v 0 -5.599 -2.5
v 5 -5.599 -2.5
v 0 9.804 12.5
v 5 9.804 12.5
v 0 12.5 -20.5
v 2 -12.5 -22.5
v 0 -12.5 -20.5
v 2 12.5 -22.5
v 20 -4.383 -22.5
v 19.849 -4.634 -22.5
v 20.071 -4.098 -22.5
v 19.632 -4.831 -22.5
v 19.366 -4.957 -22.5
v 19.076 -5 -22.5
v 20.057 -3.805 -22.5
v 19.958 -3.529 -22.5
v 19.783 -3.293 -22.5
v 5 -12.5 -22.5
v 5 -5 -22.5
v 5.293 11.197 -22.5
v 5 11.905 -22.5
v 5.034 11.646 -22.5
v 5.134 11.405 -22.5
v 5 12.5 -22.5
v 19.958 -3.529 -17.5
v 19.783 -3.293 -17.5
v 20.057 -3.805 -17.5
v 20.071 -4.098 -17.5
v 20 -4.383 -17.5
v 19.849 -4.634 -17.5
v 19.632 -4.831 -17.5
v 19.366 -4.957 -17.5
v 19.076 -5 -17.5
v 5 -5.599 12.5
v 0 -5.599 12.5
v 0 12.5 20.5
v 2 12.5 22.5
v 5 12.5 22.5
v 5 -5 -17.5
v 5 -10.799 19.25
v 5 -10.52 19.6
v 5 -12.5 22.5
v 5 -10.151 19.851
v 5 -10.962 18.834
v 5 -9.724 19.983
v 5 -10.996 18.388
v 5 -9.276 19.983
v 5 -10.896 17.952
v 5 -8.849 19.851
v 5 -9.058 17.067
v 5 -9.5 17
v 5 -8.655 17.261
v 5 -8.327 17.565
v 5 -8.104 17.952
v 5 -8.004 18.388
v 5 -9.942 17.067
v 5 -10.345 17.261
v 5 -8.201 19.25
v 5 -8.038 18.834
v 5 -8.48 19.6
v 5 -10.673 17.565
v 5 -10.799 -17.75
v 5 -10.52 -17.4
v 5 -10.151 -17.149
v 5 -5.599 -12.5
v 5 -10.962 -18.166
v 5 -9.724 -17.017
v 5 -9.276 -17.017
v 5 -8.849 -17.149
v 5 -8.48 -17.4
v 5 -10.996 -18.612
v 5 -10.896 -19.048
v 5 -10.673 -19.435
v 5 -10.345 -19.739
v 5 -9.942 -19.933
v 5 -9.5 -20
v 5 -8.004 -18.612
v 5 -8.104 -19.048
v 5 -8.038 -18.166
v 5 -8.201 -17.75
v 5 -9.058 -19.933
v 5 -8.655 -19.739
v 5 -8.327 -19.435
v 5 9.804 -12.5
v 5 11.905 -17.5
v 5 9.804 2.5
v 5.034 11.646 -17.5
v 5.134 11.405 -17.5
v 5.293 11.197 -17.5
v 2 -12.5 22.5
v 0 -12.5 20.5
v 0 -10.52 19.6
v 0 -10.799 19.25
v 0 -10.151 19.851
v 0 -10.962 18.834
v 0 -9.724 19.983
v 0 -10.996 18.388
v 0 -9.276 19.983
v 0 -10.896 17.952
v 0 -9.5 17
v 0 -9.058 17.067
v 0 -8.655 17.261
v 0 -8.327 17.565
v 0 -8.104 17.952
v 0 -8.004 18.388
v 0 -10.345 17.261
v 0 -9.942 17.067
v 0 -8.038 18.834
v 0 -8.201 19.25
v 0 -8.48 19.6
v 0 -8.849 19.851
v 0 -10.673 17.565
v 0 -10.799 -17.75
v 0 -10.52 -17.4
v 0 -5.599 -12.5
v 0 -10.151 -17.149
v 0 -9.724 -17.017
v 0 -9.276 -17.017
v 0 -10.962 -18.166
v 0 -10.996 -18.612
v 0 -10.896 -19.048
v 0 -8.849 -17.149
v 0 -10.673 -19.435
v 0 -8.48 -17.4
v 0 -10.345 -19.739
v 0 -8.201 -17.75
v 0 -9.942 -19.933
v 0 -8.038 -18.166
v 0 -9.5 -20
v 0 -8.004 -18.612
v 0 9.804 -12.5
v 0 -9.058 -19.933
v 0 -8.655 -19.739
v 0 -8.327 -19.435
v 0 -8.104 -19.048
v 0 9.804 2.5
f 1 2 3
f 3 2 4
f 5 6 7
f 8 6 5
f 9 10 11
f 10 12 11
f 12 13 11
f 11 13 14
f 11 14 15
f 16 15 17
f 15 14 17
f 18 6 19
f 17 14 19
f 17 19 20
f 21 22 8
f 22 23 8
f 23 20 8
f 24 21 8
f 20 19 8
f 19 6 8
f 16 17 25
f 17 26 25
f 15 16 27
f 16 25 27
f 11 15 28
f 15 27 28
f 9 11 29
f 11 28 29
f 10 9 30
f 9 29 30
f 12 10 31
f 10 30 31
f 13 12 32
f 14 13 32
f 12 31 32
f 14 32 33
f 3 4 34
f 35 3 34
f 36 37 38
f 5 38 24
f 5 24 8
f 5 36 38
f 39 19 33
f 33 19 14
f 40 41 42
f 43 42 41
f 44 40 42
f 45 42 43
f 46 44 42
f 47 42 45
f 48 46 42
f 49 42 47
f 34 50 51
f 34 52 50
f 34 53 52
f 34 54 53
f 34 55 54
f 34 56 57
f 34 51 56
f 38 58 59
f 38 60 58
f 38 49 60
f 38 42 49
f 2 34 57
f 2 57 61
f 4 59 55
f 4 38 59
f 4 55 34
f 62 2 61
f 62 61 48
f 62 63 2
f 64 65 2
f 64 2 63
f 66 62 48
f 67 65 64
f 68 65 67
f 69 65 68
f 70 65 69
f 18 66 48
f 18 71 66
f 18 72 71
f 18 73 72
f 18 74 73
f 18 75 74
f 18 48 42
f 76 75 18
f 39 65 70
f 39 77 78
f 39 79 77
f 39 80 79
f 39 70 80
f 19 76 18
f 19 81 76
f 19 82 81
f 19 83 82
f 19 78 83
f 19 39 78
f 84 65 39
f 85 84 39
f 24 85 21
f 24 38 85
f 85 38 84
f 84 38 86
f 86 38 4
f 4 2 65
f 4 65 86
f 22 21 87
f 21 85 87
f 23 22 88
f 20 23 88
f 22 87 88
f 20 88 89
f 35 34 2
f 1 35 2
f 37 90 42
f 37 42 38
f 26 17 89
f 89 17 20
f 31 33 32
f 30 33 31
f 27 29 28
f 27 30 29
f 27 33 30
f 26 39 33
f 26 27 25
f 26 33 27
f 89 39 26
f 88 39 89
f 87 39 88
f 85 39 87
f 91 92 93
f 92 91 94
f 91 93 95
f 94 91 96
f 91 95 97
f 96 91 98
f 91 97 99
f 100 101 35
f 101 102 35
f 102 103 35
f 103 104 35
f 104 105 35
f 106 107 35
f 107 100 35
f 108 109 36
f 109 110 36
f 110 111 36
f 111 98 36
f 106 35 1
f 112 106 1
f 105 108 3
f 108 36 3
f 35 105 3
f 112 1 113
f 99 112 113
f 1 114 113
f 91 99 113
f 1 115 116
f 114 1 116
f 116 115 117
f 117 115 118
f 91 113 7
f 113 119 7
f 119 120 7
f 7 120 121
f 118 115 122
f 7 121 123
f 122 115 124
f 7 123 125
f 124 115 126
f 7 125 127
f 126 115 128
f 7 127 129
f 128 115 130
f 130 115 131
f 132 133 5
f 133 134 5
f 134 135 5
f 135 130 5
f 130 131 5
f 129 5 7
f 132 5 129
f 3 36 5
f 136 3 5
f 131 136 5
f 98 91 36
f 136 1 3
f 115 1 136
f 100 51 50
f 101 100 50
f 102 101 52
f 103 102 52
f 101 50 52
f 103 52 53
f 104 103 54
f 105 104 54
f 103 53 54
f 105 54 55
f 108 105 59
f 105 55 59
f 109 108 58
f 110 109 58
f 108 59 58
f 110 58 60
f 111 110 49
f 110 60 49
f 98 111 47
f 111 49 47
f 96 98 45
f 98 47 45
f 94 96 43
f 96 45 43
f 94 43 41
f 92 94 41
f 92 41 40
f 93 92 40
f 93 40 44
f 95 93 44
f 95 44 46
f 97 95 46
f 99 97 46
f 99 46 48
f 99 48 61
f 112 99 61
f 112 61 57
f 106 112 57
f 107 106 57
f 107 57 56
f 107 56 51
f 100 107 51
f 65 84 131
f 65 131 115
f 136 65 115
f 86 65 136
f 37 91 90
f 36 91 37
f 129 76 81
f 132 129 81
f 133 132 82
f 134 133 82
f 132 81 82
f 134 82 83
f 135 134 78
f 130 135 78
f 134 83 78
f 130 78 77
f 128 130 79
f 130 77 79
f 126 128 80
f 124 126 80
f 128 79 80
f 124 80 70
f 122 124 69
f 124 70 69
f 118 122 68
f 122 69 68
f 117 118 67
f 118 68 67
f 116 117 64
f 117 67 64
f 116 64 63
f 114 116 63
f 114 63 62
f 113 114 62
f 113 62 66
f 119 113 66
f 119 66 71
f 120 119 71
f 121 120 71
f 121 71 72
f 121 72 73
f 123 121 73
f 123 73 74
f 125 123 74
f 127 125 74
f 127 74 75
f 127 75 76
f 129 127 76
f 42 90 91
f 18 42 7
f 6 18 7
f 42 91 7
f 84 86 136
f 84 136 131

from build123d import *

# Parameters (mm, degrees)
SKETCH1_W           = 45
SKETCH1_H           = 25
BOSS_EXTRUDE1_DEPTH = 5
SKETCH2_R           = 1.5
CUT_EXTRUDE1_DEPTH  = 27.220221204
CUT_EXTRUDE2_DEPTH  = 27.220221204
CHAMFER2_SIZE       = 2
BOSS_EXTRUDE2_DEPTH = 5
FILLET1_R           = 1


with BuildPart() as part:
    # Sketch1 → Boss-Extrude1 (new body)
    with BuildSketch(Plane(origin=(0, 0, 0), x_dir=(0, 0, -1), z_dir=(1, 0, 0))):
        Rectangle(SKETCH1_W, SKETCH1_H)
    extrude(amount=BOSS_EXTRUDE1_DEPTH)

    # Sketch2 → Cut-Extrude1 (cut, through all)
    with BuildSketch(Plane(origin=(5, 0, 0), x_dir=(0, 0, -1), z_dir=(1, 0, 0))):
        with Locations((-18.5, -9.5)):
            Circle(SKETCH2_R)
        with Locations((18.5, -9.5)):
            Circle(SKETCH2_R)
    extrude(amount=-CUT_EXTRUDE1_DEPTH, mode=Mode.SUBTRACT)

    # Sketch3 → Cut-Extrude2 (cut, through all)
    with BuildSketch(Plane(origin=(5, 0, 0), x_dir=(0, 0, -1), z_dir=(1, 0, 0))):
        Polygon((-12.5, 9.80361421), (-12.5, -5.599476508), (2.5, -5.599476508), align=None)
        Polygon((-2.5, 9.80361421), (12.5, 9.80361421), (12.5, -5.599476508), align=None)
    extrude(amount=-CUT_EXTRUDE2_DEPTH, mode=Mode.SUBTRACT)

    # Chamfer2
    chamfer2_edges = [part.edges().sort_by_distance(p)[0] for p in [
        (0, 0, 22.5),
        (0, 0, -22.5),
    ]]
    chamfer(chamfer2_edges, length=CHAMFER2_SIZE)

    # Sketch4 → Boss-Extrude2 (add)
    with BuildSketch(Plane(origin=(0, 0, -22.5), x_dir=(-1, 0, 0), z_dir=(0, 0, -1))):
        Polygon((-5, -5), (-21.490292585, -5), (-5, 11.490292585), align=None)
    extrude(amount=-BOSS_EXTRUDE2_DEPTH)

    # Fillet1
    fillet1_edges = [part.edges().sort_by_distance(p)[0] for p in [
        (5, 11.490292585, -20),
        (21.490292585, -5, -20),
    ]]
    fillet(fillet1_edges, radius=FILLET1_R)


solid = part.part
